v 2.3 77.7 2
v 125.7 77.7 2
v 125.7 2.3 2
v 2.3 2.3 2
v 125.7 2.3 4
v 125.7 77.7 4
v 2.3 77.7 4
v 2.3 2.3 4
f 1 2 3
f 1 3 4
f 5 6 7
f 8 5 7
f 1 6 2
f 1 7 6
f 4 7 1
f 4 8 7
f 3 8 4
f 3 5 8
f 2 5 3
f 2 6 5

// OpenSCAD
part=2;
 sq=[128,80];
rotate([0,0,0]){
  union (){
     *  translate([0,0,-0.9]) cube([sq.x,sq.y,6]);

   union(){
 
      
    if (part==0)   union(){color("blue")rotate([-90,0,0])linear_extrude(sq.y,convexity=10)longrow();
color("blue")rotate([0,90,0])linear_extrude(sq.x,convexity=10)shortrow();
translate(sq*.5) 
linear_extrude(2,convexity=10)difference() {square(sq,center=true);
offset (-2.3)square(sq,center=true);
}
   union(){
           rotate([0,0,0])    translate([0,15,0])   jack();
       translate([sq.x,0] )   rotate([0,0,90]) translate([0,15,0])     jack();
           translate([sq.x,sq.y] )    rotate([0,0,180])  translate([0,15,0])    jack();
       translate([0,sq.y] )      rotate([0,0,270])   translate([0,15,0]    ) jack();
            
   } }
   
 
if(part==2)color ("red") translate([0,0, 2])
    linear_extrude(2,convexity=10)translate(sq*.5)rotate([0,0,0])
    offset (-2.3)square(sq,center=true);
 

 
}
}}

module jack(){
      hull()
            {
 translate([1.5,0,4.3]               )rotate([0,0,3]) cube([3,4,1]);  
color ("red") translate([0,0,3.2])cube([2,6,1]);  }
 translate([0,0,2])cube([2,6,2]);  
        }
     
        
        module longrow(){
            
            for(x=[0:sq.x/3]){
                
            translate([1+x*3,0,0])tand();
            
            }
            
            }
        
             module shortrow(){
            
            for(y=[0:sq.y/3]){
                
            translate([0,1+y*3,0])rotate(90)tand();
            
            }
            
            }
        
       module tand (){
           hull(){
          square([2,0000.1],center=true);
           translate([0,-0.9]) square([.3,0000.1],center=true);
           }
           
           }
